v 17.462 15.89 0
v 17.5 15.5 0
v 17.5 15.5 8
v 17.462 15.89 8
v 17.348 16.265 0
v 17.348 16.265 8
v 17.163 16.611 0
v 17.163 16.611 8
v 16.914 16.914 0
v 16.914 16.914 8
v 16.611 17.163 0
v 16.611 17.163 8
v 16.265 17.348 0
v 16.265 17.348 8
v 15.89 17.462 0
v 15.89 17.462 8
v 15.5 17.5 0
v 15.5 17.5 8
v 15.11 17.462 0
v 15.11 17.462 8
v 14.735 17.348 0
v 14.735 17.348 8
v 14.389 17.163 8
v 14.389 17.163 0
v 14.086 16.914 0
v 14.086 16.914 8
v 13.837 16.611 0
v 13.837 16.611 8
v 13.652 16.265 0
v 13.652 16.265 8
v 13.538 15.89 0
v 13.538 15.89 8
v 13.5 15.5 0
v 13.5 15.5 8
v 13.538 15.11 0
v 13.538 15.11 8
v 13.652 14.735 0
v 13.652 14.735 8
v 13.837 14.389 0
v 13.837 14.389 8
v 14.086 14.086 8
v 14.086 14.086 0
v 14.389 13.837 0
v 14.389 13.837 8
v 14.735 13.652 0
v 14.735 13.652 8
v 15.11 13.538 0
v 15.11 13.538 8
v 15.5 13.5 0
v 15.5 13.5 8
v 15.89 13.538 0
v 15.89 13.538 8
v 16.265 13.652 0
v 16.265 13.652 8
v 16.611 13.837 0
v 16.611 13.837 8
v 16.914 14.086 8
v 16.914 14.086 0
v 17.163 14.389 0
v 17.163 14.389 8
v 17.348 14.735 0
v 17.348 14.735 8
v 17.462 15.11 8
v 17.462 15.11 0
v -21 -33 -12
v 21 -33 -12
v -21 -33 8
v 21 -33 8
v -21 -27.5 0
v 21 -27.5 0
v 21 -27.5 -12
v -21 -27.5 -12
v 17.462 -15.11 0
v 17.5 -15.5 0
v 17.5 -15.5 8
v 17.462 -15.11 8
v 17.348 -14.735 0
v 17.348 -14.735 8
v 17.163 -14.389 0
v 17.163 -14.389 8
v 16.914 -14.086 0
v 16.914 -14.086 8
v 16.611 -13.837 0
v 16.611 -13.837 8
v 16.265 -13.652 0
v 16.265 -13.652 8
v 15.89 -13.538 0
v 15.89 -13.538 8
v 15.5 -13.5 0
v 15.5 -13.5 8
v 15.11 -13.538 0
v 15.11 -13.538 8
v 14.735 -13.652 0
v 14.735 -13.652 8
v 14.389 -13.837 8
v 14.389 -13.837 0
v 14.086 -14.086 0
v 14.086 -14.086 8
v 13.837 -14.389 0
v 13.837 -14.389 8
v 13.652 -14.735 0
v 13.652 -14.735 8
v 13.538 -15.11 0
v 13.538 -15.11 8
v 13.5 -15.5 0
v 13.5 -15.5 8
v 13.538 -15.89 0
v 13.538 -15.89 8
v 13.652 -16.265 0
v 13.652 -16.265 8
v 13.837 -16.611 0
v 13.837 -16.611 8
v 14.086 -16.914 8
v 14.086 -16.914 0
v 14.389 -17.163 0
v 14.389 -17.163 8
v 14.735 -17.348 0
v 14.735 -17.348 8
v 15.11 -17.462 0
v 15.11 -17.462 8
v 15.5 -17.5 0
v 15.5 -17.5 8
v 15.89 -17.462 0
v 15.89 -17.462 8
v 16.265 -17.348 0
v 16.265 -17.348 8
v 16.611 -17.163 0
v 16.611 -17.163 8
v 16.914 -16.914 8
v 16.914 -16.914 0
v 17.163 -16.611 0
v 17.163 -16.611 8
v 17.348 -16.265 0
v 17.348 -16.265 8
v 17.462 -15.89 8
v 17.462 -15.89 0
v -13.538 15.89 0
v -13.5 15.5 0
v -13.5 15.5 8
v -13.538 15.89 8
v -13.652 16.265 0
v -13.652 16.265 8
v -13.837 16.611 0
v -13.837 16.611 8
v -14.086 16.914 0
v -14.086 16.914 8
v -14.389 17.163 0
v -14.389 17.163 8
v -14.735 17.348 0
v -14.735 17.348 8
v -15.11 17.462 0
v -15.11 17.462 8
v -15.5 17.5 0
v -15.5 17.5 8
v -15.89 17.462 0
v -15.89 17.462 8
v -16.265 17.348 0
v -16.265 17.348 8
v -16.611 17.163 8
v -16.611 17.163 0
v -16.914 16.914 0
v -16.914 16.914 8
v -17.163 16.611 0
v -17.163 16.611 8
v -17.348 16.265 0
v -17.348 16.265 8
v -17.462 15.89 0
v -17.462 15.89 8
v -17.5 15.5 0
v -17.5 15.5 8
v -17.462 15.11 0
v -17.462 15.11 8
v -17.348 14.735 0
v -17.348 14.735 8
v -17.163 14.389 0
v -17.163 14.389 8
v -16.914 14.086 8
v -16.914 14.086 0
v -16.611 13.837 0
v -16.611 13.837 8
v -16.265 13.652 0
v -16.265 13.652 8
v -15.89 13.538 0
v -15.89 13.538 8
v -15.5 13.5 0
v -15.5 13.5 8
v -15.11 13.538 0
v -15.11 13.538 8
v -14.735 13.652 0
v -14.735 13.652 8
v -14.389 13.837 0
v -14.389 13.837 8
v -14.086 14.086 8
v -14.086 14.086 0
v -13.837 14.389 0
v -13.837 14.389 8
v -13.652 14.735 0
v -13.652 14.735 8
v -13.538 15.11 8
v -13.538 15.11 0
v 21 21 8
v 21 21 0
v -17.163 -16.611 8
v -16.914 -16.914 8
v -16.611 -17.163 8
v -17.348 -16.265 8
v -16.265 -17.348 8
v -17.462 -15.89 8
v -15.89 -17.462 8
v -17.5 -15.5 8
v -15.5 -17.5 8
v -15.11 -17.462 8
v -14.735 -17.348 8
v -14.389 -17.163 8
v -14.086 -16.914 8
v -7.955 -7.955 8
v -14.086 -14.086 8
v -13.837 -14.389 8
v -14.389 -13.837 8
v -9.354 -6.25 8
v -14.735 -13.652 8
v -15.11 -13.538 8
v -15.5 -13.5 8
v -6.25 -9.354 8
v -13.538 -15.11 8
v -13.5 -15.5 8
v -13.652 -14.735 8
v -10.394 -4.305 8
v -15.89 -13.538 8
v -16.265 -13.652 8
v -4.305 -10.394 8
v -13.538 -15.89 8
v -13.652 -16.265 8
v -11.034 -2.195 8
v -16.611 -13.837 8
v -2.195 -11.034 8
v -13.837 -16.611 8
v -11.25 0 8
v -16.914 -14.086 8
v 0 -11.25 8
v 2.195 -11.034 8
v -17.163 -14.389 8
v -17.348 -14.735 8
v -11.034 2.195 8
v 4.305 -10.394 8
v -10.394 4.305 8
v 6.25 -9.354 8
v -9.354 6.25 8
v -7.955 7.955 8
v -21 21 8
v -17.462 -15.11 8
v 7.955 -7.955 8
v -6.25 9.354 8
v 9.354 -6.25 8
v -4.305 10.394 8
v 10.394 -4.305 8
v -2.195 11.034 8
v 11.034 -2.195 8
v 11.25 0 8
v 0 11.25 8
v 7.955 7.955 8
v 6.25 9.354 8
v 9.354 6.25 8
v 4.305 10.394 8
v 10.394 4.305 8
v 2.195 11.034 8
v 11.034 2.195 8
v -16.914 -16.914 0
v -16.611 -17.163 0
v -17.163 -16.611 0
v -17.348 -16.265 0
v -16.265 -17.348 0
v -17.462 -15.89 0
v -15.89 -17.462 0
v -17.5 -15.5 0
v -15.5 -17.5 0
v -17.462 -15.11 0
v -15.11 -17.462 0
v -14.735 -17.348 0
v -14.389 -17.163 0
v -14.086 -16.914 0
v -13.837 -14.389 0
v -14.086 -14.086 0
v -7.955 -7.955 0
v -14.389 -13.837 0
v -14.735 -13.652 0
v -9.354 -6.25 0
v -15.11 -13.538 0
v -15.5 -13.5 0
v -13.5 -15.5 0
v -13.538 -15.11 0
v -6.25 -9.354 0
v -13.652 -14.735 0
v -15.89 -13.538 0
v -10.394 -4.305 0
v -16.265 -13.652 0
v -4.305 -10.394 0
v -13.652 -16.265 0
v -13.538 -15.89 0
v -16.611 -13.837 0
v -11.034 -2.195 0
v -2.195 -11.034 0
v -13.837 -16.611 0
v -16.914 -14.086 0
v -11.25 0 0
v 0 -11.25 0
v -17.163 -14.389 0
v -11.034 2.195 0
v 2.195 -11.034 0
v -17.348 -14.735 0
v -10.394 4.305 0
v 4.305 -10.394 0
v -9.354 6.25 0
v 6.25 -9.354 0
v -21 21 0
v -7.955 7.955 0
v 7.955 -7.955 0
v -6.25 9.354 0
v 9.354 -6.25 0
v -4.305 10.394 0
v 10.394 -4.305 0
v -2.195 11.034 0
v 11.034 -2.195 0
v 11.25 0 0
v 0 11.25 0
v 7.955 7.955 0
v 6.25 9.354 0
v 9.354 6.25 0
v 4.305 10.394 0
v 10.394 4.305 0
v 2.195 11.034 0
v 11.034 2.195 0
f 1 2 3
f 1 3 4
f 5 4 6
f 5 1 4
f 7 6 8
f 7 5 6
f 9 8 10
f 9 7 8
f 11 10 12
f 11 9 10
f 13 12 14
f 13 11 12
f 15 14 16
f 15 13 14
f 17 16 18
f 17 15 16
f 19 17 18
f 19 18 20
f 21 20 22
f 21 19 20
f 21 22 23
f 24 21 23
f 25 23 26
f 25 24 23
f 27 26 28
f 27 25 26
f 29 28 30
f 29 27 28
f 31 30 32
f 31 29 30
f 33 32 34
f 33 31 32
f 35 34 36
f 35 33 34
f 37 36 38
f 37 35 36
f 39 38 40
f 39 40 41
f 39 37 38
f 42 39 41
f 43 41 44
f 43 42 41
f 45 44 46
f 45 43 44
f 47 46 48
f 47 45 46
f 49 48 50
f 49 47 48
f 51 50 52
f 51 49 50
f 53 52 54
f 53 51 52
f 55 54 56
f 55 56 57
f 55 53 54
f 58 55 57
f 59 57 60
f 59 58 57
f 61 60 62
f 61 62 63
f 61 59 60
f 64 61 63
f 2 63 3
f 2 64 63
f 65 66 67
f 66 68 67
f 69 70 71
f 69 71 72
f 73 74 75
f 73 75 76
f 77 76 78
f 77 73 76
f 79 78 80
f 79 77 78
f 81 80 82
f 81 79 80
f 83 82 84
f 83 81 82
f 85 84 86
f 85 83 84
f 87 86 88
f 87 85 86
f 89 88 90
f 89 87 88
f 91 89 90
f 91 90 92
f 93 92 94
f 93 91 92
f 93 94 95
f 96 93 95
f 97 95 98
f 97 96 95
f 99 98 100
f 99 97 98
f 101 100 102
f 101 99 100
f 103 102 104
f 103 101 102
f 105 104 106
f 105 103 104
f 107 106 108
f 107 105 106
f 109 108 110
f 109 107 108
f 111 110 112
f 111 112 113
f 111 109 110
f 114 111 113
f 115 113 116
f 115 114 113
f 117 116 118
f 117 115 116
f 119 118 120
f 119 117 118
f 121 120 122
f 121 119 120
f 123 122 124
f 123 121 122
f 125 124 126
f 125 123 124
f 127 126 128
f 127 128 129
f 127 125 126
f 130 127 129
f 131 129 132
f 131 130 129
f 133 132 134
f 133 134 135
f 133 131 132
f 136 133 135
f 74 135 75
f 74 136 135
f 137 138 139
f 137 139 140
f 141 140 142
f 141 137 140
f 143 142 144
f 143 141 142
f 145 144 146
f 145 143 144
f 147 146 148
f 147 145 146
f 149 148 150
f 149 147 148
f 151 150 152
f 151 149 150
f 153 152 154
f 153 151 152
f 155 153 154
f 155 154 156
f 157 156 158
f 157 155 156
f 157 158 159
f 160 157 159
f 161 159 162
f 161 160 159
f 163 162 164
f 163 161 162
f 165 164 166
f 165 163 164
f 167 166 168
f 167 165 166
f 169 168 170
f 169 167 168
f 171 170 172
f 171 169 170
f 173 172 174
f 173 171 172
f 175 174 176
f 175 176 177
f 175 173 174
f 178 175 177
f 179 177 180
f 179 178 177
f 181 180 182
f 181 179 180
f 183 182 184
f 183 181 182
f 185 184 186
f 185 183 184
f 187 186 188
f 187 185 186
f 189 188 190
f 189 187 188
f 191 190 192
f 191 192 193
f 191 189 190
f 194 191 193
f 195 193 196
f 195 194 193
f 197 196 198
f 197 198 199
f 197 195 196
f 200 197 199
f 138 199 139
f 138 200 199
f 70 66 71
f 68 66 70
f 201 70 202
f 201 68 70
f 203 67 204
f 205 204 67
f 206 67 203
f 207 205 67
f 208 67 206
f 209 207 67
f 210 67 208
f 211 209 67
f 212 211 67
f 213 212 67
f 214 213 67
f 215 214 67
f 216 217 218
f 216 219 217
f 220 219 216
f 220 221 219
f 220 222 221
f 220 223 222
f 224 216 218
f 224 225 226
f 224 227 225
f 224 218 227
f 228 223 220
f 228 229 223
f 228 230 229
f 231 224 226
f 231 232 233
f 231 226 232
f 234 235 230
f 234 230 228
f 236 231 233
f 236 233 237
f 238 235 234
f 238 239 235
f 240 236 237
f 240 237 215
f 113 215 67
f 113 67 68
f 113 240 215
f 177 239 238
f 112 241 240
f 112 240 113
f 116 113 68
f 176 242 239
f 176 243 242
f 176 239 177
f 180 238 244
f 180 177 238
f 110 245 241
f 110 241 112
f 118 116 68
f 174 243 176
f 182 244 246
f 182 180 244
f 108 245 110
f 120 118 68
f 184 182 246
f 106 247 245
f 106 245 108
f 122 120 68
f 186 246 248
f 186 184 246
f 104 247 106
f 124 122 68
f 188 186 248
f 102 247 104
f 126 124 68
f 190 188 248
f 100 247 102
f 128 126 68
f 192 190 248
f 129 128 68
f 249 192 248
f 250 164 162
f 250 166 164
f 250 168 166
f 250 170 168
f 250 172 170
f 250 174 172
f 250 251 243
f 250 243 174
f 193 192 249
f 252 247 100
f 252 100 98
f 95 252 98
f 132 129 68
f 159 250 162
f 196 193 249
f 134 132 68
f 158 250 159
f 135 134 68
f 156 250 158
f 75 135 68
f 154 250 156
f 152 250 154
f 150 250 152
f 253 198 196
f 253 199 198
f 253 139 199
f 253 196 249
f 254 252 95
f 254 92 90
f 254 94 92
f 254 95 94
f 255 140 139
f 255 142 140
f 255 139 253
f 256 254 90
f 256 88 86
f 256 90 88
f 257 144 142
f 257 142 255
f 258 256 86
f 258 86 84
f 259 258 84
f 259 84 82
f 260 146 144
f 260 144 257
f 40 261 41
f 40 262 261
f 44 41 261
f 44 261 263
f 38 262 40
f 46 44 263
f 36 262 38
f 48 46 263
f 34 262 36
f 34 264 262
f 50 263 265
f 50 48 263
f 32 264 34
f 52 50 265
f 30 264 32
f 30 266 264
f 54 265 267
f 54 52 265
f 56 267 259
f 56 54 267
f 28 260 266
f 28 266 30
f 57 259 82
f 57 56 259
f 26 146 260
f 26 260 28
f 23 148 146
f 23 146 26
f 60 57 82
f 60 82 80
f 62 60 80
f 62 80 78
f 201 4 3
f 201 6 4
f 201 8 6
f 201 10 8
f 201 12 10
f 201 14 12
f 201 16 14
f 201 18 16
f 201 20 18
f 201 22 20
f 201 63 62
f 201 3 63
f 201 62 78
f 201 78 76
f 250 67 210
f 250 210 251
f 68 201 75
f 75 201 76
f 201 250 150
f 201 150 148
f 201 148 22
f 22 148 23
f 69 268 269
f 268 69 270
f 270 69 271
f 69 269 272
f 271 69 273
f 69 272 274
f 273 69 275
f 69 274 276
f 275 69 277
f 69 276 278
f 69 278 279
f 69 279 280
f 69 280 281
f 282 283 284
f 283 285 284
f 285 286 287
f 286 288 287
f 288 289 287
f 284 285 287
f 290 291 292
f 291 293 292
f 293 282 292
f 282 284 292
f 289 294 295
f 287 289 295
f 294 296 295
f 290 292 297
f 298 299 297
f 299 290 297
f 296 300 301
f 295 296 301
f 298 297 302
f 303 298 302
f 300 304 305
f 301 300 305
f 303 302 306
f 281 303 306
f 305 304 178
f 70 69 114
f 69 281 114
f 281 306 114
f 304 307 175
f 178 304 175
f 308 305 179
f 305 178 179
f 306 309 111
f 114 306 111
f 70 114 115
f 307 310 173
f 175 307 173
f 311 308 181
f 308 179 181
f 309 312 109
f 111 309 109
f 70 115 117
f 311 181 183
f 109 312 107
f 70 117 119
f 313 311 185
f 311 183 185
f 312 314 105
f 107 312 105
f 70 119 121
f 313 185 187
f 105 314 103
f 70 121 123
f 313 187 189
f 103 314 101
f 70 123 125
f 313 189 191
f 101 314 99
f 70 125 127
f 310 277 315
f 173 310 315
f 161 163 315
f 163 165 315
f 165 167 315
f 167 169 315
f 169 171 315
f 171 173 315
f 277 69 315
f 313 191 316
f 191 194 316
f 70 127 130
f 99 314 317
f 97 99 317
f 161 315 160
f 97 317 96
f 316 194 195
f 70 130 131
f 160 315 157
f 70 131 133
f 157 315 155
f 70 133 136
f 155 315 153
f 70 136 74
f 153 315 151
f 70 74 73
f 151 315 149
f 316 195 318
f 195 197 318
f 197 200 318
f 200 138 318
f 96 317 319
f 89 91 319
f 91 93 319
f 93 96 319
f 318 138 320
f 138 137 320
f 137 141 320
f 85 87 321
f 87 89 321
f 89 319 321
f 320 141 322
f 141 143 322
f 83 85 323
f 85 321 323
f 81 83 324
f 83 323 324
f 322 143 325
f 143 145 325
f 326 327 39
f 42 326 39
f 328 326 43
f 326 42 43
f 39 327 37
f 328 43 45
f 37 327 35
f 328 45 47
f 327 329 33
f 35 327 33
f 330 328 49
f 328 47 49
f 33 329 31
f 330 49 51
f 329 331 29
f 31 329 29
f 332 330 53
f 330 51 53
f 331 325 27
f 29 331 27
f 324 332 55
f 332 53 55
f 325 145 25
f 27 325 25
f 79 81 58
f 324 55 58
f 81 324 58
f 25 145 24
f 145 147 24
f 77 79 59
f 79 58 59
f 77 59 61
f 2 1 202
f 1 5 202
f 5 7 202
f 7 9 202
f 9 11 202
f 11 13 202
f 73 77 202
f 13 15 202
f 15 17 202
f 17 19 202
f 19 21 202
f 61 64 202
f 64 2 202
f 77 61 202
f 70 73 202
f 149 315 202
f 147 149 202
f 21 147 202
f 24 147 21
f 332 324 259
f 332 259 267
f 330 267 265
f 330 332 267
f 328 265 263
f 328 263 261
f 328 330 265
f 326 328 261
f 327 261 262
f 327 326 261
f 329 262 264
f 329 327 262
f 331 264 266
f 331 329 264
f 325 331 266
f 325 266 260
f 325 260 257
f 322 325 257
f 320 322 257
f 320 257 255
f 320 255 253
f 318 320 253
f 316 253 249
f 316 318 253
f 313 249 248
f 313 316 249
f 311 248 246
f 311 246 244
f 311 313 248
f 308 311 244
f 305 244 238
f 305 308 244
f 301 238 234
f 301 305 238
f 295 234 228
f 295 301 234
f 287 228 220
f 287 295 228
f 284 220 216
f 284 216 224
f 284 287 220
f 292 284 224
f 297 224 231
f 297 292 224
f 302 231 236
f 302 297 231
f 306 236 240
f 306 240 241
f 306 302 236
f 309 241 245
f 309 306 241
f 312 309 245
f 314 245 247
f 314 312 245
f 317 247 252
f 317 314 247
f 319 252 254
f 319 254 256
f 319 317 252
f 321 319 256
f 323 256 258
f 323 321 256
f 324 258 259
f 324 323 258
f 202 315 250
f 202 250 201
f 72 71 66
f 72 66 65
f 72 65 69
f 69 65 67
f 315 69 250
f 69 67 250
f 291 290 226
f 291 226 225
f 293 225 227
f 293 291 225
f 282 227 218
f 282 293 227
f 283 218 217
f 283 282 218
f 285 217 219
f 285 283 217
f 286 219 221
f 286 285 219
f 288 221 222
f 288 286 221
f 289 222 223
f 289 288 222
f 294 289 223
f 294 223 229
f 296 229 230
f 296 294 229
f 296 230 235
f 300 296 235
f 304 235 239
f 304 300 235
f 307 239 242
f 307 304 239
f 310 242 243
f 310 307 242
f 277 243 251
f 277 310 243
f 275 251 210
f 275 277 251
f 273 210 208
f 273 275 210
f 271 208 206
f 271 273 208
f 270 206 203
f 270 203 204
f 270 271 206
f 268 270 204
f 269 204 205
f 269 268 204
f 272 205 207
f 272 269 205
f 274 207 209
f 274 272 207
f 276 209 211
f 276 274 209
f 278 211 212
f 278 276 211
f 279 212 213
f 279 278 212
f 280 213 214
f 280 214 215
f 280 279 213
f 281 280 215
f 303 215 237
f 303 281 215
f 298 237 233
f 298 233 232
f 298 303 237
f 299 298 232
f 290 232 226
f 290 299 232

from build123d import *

# Parameters (mm, degrees)
ESQUISSE1_W        = 42
ESQUISSE1_H        = 42
ESQUISSE1_R        = 2
ESQUISSE1_R_2      = 11.25
BOSS_EXTRU_1_DEPTH = 8
ESQUISSE2_W        = 42
ESQUISSE2_H        = 12
BOSS_EXTRU_2_DEPTH = 8
ESQUISSE3_W        = 42
ESQUISSE3_H        = 5.5
BOSS_EXTRU_3_DEPTH = 12


with BuildPart() as part:
    # Esquisse1 → Boss.-Extru.1 (new body)
    with BuildSketch(Plane.XY):
        Rectangle(ESQUISSE1_W, ESQUISSE1_H)
        with Locations((-15.5, 15.5)):
            Circle(ESQUISSE1_R, mode=Mode.SUBTRACT)
        with Locations((15.5, 15.5)):
            Circle(ESQUISSE1_R, mode=Mode.SUBTRACT)
        with Locations((15.5, -15.5)):
            Circle(ESQUISSE1_R, mode=Mode.SUBTRACT)
        with Locations((-15.5, -15.5)):
            Circle(ESQUISSE1_R, mode=Mode.SUBTRACT)
        Circle(ESQUISSE1_R_2, mode=Mode.SUBTRACT)
    extrude(amount=BOSS_EXTRU_1_DEPTH)

    # Esquisse2 → Boss.-Extru.2 (add)
    with BuildSketch(Plane.XY.offset(8)):
        with Locations((0, -27)):
            Rectangle(ESQUISSE2_W, ESQUISSE2_H)
    extrude(amount=-BOSS_EXTRU_2_DEPTH)

    # Esquisse3 → Boss.-Extru.3 (add)
    with BuildSketch(Plane(origin=(0, 0, 0), x_dir=(-1, 0, 0), z_dir=(0, 0, -1))):
        with Locations((0, -30.25)):
            Rectangle(ESQUISSE3_W, ESQUISSE3_H)
    extrude(amount=BOSS_EXTRU_3_DEPTH)


solid = part.part
